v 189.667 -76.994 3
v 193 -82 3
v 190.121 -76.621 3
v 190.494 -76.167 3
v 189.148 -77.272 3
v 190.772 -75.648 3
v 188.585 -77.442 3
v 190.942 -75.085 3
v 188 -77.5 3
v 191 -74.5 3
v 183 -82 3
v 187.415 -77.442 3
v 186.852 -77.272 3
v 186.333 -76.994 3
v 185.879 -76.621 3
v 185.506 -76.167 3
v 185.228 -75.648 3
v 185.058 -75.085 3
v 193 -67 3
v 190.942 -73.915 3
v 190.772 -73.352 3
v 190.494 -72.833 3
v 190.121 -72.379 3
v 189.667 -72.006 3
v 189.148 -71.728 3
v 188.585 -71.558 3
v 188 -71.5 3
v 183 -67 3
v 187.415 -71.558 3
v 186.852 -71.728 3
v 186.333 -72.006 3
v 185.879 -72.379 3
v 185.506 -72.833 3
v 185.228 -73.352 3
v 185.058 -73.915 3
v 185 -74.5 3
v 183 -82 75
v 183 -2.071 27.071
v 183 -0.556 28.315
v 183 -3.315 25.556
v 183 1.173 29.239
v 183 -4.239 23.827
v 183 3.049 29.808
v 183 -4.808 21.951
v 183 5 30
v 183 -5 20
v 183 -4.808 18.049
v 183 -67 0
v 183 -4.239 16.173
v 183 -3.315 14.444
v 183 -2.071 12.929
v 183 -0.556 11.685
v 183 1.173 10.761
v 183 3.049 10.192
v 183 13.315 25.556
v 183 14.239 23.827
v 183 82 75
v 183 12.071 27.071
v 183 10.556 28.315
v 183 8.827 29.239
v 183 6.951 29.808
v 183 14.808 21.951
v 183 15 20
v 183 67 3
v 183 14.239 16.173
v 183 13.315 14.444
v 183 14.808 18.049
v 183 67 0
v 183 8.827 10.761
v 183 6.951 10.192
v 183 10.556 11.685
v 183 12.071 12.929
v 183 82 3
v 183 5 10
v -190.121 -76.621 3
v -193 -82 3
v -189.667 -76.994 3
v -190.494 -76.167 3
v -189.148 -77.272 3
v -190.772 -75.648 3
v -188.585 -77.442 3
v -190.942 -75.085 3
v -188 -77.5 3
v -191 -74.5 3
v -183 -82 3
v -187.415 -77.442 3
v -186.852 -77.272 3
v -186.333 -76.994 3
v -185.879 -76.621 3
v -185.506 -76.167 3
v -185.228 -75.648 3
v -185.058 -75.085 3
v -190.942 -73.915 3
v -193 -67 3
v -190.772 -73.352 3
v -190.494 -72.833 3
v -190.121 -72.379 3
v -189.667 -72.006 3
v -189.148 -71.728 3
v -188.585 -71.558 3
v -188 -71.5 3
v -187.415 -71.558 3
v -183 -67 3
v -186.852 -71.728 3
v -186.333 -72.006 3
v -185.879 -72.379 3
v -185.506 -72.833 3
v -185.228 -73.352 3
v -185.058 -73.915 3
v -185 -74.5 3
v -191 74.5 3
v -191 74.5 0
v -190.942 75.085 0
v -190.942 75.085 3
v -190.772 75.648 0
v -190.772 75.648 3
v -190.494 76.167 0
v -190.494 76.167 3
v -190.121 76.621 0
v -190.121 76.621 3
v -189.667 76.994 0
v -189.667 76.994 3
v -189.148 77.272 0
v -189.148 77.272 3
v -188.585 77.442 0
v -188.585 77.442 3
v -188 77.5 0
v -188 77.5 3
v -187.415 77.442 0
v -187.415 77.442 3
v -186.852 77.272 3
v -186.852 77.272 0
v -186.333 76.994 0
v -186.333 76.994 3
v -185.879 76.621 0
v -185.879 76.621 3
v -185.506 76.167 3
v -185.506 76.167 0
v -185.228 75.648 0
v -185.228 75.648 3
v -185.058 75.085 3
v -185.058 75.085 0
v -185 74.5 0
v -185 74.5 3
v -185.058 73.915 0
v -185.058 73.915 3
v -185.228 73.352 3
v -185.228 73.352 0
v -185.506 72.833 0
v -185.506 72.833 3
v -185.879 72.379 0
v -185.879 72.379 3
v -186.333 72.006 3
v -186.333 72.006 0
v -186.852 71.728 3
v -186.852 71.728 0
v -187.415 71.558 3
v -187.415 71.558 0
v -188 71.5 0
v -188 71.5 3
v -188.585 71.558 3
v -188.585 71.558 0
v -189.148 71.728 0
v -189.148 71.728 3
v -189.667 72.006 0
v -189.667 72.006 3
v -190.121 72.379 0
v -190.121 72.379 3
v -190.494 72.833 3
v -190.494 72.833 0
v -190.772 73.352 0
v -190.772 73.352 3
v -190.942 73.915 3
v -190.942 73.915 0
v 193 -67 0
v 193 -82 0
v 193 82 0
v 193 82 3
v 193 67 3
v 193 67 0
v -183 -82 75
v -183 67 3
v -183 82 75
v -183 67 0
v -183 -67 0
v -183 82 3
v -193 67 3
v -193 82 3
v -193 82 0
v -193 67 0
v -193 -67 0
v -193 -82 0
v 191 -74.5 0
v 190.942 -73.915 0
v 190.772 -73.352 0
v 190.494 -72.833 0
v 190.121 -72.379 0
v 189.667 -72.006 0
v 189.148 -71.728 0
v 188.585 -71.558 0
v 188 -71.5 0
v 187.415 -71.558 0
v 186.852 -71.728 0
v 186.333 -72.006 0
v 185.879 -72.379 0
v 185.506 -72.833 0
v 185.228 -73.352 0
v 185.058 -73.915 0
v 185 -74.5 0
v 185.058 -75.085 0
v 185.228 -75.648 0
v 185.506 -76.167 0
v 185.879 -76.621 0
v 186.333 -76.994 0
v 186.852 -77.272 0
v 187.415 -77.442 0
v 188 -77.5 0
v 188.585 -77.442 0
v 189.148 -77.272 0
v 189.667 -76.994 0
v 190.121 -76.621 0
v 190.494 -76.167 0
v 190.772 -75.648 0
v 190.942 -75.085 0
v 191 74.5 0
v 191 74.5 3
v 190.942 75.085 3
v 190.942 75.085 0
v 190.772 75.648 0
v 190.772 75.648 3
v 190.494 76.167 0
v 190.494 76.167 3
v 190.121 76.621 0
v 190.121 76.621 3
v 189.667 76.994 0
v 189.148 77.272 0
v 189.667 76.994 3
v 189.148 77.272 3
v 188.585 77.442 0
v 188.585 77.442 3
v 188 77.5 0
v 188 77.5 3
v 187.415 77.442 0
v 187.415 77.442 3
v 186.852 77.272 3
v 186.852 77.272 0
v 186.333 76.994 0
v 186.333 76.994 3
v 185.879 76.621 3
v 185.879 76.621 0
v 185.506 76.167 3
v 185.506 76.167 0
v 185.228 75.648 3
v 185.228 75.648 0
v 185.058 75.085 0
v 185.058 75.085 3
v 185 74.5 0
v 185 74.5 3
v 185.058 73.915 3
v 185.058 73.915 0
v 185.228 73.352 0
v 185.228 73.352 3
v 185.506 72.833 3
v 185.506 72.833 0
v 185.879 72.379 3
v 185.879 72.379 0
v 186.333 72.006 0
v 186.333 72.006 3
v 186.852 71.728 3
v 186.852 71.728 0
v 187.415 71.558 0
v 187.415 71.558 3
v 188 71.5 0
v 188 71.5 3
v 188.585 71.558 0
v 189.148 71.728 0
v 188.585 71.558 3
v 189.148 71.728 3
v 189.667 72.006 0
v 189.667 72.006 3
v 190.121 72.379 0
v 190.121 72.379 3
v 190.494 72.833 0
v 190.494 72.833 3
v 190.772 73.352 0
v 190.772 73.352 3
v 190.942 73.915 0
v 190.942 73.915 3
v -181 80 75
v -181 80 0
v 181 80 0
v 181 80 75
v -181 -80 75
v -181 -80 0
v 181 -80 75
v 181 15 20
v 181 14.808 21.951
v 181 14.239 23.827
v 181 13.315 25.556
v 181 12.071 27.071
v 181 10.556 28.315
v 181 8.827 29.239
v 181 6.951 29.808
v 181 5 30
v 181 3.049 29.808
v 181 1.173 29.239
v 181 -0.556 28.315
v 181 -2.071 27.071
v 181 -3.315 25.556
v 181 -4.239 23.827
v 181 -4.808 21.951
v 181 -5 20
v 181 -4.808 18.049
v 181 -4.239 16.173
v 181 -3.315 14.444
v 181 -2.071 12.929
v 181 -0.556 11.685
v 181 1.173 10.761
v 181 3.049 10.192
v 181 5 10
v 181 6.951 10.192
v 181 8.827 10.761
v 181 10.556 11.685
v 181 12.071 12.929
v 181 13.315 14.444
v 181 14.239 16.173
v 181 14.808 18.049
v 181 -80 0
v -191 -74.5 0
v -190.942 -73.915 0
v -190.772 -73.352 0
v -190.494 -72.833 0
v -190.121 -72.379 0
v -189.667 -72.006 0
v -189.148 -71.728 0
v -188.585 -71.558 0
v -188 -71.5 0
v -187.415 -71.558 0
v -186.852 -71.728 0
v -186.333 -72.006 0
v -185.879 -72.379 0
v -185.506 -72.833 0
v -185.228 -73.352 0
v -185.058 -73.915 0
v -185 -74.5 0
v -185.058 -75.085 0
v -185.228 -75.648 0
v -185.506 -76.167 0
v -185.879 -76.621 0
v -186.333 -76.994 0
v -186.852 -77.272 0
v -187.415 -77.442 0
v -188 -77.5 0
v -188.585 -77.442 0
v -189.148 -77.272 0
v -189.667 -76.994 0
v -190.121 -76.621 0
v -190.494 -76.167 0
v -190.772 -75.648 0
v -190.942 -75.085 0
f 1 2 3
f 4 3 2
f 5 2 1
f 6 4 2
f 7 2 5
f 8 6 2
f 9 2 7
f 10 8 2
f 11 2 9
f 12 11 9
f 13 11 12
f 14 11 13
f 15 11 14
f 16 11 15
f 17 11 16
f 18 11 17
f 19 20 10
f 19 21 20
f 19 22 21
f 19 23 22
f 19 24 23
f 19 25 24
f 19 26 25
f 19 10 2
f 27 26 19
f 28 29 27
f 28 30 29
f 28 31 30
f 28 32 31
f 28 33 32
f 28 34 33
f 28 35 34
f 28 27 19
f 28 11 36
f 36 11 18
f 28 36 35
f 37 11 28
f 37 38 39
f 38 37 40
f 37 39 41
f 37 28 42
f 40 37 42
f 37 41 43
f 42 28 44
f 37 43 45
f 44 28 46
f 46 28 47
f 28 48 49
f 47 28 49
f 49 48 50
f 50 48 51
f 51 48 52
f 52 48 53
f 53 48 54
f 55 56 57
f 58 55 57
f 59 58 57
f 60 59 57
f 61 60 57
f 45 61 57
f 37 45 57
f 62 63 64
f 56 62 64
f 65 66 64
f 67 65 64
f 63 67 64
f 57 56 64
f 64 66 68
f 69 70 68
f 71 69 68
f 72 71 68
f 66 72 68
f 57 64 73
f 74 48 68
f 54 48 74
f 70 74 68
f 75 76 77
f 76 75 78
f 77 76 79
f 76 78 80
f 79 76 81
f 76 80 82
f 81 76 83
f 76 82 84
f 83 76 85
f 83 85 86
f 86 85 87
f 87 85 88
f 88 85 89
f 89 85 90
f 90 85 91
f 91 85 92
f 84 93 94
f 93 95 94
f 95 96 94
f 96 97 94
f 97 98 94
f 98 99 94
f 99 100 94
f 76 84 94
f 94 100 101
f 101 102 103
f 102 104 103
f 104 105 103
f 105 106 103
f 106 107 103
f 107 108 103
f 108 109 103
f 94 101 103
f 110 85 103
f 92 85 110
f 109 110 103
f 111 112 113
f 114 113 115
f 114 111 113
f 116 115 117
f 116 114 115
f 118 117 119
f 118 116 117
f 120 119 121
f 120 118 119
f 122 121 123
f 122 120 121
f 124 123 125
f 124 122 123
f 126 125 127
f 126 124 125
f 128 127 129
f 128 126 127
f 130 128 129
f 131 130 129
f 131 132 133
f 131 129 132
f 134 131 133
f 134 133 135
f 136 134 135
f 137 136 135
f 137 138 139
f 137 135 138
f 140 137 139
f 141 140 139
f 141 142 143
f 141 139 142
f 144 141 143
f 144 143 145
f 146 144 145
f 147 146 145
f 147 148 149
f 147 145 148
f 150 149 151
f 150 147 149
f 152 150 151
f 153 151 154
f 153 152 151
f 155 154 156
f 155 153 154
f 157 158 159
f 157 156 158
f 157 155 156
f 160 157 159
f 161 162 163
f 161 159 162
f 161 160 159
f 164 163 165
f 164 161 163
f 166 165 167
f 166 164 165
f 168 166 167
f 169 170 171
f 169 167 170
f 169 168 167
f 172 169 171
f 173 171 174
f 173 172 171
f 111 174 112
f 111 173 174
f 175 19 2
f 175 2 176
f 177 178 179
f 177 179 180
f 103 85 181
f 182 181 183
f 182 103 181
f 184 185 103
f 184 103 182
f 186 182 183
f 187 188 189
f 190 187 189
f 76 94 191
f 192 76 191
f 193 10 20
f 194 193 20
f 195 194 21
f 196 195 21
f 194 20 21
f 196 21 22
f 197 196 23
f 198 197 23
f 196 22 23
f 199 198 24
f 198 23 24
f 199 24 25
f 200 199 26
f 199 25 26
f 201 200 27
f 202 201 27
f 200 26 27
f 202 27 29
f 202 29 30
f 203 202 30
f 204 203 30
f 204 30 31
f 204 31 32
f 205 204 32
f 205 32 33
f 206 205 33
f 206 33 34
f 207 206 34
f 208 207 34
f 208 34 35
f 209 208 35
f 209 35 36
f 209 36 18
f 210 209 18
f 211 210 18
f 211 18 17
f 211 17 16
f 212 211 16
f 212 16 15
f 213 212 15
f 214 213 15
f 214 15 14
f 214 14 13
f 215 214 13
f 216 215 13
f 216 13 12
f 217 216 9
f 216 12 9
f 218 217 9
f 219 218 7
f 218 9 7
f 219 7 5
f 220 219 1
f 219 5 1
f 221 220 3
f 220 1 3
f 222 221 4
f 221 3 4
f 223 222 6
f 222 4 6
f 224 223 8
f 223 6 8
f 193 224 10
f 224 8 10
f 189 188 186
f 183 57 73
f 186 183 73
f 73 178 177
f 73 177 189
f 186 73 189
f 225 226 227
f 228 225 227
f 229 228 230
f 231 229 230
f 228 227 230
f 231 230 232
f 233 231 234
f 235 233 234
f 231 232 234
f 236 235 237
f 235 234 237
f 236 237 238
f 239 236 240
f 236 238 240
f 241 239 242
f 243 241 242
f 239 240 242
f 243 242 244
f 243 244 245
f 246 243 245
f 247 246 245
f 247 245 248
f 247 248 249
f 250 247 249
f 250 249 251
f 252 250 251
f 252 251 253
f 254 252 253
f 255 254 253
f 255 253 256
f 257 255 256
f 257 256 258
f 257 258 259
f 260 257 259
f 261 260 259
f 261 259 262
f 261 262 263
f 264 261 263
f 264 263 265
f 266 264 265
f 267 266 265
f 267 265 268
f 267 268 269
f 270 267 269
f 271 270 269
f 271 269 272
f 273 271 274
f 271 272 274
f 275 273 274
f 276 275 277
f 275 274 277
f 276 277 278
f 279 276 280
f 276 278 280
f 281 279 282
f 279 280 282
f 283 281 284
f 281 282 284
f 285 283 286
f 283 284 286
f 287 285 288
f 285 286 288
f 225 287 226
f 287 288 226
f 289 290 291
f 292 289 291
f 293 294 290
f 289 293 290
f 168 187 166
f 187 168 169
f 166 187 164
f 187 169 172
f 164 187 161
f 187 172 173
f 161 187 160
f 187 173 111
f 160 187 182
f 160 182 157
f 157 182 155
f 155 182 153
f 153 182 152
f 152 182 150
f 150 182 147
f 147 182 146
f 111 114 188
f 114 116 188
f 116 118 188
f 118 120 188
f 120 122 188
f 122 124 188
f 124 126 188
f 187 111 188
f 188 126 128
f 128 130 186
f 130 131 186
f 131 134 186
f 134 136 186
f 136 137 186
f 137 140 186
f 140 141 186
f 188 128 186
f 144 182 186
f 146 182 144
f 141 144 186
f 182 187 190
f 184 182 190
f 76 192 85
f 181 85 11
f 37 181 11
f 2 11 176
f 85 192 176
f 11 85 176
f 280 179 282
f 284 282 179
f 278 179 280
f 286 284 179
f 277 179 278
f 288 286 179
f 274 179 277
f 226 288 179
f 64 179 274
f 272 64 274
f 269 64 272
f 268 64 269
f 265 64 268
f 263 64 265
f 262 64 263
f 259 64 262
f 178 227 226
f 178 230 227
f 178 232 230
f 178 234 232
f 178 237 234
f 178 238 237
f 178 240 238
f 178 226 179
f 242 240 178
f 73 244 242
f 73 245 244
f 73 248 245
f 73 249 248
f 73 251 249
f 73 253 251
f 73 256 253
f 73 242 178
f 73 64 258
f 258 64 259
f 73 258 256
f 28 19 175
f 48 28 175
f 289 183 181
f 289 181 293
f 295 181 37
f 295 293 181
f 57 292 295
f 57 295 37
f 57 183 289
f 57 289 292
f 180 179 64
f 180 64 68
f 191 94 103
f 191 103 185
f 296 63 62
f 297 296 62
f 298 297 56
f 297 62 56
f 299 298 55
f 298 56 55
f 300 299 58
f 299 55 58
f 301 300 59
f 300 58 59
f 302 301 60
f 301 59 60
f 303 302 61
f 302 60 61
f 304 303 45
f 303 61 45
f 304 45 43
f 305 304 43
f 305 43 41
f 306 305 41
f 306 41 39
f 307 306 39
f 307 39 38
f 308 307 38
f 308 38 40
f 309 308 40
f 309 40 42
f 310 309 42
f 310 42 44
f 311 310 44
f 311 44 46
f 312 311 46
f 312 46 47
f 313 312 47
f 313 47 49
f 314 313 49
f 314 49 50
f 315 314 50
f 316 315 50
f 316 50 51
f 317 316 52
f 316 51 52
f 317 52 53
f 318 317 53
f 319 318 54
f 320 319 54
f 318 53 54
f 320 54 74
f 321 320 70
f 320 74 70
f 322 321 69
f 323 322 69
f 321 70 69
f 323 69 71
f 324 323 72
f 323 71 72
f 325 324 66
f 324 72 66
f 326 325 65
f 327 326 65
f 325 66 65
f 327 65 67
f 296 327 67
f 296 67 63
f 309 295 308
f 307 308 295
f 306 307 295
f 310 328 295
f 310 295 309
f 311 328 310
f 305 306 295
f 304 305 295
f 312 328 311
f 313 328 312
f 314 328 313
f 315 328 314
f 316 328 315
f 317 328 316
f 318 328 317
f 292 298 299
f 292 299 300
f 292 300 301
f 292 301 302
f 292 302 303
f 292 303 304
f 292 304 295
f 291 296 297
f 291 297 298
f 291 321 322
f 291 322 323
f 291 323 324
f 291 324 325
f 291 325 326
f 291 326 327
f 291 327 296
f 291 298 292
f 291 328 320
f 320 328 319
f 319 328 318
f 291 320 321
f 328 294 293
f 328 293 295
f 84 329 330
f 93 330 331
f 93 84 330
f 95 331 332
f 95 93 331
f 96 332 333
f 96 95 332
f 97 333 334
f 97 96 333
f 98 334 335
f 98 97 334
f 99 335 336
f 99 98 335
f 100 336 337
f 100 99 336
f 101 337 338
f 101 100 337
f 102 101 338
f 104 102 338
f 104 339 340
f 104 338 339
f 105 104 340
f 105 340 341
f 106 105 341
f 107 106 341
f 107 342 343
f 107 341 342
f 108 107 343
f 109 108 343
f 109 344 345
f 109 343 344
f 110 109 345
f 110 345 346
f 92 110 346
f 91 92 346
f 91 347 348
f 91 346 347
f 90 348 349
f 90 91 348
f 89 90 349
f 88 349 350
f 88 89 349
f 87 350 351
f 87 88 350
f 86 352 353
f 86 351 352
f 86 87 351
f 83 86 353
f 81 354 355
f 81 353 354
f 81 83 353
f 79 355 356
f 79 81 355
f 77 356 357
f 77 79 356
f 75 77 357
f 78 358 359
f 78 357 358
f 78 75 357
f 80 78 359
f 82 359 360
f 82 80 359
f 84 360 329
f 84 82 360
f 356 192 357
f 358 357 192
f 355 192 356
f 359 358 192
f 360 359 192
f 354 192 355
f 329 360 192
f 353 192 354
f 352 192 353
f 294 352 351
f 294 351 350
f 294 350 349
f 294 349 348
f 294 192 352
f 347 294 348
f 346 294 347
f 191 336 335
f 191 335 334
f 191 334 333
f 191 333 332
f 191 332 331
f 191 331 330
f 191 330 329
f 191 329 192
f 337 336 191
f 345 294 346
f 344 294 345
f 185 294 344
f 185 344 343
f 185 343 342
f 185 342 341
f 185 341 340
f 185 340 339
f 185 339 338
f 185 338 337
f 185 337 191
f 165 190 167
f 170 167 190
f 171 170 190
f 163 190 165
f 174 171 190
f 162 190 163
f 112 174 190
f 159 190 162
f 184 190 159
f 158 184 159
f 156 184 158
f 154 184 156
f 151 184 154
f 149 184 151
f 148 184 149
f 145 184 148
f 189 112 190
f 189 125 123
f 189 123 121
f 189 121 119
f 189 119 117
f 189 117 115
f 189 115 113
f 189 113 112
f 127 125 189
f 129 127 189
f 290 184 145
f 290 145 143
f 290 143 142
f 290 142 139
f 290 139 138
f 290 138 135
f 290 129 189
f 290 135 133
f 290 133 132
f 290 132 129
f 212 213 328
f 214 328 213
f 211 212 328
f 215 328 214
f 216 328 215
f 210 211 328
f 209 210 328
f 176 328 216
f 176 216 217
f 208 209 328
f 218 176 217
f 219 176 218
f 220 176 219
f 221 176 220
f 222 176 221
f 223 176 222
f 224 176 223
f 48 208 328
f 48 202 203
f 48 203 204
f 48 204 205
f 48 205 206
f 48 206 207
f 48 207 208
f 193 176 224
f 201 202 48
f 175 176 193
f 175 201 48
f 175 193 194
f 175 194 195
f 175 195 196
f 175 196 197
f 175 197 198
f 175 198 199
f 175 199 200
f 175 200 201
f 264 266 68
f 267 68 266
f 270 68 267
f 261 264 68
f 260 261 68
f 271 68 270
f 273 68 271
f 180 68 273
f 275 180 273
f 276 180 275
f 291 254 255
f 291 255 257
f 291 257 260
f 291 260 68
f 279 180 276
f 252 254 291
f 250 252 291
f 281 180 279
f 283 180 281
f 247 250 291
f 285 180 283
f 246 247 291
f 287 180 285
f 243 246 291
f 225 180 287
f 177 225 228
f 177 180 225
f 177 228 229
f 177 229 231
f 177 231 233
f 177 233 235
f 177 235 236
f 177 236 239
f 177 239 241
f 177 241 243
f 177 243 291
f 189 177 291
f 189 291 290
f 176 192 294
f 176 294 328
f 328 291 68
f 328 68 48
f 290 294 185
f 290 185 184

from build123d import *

# Parameters (mm, degrees)
SKETCH_1_W          = 366
SKETCH_1_H          = 164
SKETCH_1_W_2        = 362
SKETCH_1_H_2        = 160
EXTRUDE_1_DEPTH     = 75
SKETCH_2_W          = 3
SKETCH_2_H          = 15
EXTRUDE_2_DEPTH     = 10
SKETCH_3_R          = 3
CUT_EXTRUDE_1_DEPTH = 10
SKETCH_4_R          = 10
CUT_EXTRUDE_2_DEPTH = 10


with BuildPart() as part:
    # 草圖1 → 填料-伸長1 (new body)
    with BuildSketch(Plane.XY):
        Rectangle(SKETCH_1_W, SKETCH_1_H)
        Rectangle(SKETCH_1_W_2, SKETCH_1_H_2, mode=Mode.SUBTRACT)
    extrude(amount=EXTRUDE_1_DEPTH)

    # 草圖2 → 填料-伸長2 (add)
    with BuildSketch(Plane(origin=(183, 0, 0), x_dir=(0, 0, -1), z_dir=(1, 0, 0))):
        with Locations((-1.5, 74.5)):
            Rectangle(SKETCH_2_W, SKETCH_2_H)
        with Locations((-1.5, -74.5)):
            Rectangle(SKETCH_2_W, SKETCH_2_H)
    extrude_2 = extrude(amount=EXTRUDE_2_DEPTH)

    # 鏡射1: 填料-伸長2 across plane
    add(extrude_2.mirror(Plane(origin=(0, 0, 0), x_dir=(0, 0, 1), z_dir=(1, 0, 0))))

    # 草圖3 → 除料-伸長1 (cut)
    with BuildSketch(Plane.XY.offset(3)):
        with Locations((188, 74.5)):
            Circle(SKETCH_3_R)
        with Locations((188, -74.5)):
            Circle(SKETCH_3_R)
    cut_extrude_1 = extrude(amount=-CUT_EXTRUDE_1_DEPTH, mode=Mode.SUBTRACT)

    # 鏡射3: 除料-伸長1 across plane
    add(cut_extrude_1.mirror(Plane(origin=(0, 0, 0), x_dir=(0, 0, 1), z_dir=(1, 0, 0))), mode=Mode.SUBTRACT)

    # 草圖4 → 除料-伸長2 (cut)
    with BuildSketch(Plane(origin=(183, 0, 0), x_dir=(0, 0, -1), z_dir=(1, 0, 0))):
        with Locations(Location((-20, 5, 0), (0, 0, 90))):
            Circle(SKETCH_4_R)
    extrude(amount=-CUT_EXTRUDE_2_DEPTH, mode=Mode.SUBTRACT)


solid = part.part
